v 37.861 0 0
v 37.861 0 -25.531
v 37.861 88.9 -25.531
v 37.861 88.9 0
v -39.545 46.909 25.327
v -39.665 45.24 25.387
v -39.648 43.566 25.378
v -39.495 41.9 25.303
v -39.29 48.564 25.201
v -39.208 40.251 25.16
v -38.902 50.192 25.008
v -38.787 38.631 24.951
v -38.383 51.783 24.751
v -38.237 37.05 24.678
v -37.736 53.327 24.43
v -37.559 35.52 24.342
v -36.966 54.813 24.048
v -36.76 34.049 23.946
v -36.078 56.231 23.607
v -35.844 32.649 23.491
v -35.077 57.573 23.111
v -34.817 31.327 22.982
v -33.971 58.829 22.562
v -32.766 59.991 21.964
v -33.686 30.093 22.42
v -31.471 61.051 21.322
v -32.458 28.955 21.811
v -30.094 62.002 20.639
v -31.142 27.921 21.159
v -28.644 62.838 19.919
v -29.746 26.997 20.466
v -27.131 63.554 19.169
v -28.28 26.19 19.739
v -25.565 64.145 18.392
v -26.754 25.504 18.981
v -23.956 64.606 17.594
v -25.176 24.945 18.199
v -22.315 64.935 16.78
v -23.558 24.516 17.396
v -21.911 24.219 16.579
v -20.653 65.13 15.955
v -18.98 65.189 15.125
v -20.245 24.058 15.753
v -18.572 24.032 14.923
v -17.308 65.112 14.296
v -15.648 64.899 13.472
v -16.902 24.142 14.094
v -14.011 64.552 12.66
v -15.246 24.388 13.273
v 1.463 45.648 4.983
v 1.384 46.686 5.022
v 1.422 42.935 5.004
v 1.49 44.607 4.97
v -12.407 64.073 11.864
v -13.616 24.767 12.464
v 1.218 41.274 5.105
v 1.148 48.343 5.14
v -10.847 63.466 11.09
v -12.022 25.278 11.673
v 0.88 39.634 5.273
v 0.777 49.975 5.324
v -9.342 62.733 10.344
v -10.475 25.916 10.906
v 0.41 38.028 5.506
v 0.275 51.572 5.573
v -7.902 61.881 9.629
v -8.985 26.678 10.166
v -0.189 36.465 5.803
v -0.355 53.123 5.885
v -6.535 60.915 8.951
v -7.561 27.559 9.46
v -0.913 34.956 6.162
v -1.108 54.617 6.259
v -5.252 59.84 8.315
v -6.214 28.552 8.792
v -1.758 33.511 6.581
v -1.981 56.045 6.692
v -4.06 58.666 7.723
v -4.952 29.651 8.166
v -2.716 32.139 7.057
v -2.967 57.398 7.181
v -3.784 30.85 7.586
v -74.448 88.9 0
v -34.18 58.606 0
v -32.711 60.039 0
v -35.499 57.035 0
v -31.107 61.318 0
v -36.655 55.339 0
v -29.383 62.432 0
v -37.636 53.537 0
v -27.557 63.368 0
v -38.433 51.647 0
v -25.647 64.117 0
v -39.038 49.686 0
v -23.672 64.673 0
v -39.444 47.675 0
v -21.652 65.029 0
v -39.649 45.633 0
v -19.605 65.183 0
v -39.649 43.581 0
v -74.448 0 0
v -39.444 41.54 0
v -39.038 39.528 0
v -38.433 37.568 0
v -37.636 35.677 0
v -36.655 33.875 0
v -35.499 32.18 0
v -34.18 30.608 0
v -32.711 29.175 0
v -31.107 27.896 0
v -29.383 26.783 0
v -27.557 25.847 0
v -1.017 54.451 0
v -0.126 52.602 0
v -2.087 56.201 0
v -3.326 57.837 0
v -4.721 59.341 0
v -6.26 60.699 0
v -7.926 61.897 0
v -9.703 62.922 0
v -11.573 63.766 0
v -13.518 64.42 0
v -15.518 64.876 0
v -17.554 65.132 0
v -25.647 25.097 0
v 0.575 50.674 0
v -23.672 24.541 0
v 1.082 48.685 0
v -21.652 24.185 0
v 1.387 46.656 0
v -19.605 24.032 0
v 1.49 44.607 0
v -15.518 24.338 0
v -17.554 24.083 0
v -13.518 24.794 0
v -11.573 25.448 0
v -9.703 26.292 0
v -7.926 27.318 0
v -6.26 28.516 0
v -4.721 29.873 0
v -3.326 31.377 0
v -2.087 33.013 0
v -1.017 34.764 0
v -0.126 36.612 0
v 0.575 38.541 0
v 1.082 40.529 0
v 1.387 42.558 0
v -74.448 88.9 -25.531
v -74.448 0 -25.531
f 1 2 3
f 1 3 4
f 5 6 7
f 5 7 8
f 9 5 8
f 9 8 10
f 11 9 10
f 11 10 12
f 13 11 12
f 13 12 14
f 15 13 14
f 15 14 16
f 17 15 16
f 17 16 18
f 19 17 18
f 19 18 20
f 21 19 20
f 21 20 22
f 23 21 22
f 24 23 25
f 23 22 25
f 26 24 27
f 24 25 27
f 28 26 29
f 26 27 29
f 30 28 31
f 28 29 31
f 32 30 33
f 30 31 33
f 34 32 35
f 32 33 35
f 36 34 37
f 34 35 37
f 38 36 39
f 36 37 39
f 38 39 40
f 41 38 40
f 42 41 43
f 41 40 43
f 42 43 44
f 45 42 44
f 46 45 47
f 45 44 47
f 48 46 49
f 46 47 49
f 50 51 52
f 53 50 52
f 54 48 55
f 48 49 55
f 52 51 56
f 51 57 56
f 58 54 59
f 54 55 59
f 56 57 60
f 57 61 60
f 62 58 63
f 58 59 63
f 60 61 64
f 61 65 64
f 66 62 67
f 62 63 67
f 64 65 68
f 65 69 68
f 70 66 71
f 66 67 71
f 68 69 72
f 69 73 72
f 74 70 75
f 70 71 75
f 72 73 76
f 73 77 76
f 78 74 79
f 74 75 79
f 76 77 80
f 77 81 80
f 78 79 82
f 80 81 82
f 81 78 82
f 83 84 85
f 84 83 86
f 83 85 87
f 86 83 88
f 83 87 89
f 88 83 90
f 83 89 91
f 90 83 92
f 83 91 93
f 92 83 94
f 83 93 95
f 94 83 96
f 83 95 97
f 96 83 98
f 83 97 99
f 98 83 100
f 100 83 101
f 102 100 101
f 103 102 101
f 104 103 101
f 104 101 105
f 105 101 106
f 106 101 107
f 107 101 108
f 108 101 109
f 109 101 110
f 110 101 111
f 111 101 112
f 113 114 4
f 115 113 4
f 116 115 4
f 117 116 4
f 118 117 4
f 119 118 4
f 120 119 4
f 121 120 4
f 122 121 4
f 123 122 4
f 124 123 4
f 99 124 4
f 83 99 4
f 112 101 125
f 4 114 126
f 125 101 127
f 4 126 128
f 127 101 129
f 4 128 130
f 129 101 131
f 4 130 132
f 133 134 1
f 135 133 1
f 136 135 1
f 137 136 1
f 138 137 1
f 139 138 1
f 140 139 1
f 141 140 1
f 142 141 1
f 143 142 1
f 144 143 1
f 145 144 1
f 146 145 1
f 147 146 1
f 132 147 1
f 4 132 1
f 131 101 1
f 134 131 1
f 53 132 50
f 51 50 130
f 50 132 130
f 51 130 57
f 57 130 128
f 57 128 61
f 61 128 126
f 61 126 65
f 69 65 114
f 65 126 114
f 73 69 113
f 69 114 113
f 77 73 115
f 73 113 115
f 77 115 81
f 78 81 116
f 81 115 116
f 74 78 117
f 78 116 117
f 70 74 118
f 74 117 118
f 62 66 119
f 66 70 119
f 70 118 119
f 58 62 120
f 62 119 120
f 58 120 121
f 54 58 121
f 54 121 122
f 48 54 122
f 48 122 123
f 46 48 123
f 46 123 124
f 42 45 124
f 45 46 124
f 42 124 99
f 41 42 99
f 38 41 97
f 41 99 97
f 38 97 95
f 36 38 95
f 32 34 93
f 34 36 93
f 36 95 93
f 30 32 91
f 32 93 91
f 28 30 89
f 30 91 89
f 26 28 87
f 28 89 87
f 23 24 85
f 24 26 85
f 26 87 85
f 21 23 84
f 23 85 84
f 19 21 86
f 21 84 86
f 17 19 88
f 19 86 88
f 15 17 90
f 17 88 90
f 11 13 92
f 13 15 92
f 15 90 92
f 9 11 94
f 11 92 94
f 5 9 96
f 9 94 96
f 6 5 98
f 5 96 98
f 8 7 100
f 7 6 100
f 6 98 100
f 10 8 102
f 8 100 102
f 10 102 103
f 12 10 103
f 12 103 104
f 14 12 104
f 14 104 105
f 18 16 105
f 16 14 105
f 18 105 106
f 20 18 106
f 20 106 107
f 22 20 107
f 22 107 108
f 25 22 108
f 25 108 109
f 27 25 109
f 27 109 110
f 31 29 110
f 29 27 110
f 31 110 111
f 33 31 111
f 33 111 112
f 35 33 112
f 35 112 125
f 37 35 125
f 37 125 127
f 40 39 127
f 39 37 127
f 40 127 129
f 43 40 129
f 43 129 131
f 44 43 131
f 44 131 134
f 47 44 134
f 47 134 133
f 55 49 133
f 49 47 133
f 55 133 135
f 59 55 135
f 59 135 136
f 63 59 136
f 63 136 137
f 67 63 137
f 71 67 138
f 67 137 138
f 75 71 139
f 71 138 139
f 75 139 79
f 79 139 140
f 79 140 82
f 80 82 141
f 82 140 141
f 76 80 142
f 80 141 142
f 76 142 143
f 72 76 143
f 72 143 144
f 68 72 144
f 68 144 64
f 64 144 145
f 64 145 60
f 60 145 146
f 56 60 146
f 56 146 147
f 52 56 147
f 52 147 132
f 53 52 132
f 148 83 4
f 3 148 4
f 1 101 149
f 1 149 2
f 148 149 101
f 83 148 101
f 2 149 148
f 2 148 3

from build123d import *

# Parameters (mm, degrees)
F0_W     = 112.308848
F0_H     = 25.530828
F1_DEPTH = 88.9
F2_R     = 20.581967
F3_DEPTH = 25.4
F5_DEPTH = 177.8


with BuildPart() as f1:
    # F0 (on Front) → F1 (new body)
    with BuildSketch(Plane.XZ):
        with Locations((-18.293744, -12.765414)):
            Rectangle(F0_W, F0_H)
    extrude(amount=-F1_DEPTH)

    # F2 (on Top) → F3 (join)
    with BuildSketch(Plane.XY):
        with Locations((-19.09228, 44.607155)):
            Circle(F2_R)
    extrude(amount=F3_DEPTH)

    # F4 (on Front) → F5 (cut)
    with BuildSketch(Plane.XZ):
        Polygon((5.159772, 39.870981), (-63.458517, 37.190579), (5.159772, 3.149472), align=None)
    extrude(amount=-F5_DEPTH, mode=Mode.SUBTRACT)


solid = f1.part
